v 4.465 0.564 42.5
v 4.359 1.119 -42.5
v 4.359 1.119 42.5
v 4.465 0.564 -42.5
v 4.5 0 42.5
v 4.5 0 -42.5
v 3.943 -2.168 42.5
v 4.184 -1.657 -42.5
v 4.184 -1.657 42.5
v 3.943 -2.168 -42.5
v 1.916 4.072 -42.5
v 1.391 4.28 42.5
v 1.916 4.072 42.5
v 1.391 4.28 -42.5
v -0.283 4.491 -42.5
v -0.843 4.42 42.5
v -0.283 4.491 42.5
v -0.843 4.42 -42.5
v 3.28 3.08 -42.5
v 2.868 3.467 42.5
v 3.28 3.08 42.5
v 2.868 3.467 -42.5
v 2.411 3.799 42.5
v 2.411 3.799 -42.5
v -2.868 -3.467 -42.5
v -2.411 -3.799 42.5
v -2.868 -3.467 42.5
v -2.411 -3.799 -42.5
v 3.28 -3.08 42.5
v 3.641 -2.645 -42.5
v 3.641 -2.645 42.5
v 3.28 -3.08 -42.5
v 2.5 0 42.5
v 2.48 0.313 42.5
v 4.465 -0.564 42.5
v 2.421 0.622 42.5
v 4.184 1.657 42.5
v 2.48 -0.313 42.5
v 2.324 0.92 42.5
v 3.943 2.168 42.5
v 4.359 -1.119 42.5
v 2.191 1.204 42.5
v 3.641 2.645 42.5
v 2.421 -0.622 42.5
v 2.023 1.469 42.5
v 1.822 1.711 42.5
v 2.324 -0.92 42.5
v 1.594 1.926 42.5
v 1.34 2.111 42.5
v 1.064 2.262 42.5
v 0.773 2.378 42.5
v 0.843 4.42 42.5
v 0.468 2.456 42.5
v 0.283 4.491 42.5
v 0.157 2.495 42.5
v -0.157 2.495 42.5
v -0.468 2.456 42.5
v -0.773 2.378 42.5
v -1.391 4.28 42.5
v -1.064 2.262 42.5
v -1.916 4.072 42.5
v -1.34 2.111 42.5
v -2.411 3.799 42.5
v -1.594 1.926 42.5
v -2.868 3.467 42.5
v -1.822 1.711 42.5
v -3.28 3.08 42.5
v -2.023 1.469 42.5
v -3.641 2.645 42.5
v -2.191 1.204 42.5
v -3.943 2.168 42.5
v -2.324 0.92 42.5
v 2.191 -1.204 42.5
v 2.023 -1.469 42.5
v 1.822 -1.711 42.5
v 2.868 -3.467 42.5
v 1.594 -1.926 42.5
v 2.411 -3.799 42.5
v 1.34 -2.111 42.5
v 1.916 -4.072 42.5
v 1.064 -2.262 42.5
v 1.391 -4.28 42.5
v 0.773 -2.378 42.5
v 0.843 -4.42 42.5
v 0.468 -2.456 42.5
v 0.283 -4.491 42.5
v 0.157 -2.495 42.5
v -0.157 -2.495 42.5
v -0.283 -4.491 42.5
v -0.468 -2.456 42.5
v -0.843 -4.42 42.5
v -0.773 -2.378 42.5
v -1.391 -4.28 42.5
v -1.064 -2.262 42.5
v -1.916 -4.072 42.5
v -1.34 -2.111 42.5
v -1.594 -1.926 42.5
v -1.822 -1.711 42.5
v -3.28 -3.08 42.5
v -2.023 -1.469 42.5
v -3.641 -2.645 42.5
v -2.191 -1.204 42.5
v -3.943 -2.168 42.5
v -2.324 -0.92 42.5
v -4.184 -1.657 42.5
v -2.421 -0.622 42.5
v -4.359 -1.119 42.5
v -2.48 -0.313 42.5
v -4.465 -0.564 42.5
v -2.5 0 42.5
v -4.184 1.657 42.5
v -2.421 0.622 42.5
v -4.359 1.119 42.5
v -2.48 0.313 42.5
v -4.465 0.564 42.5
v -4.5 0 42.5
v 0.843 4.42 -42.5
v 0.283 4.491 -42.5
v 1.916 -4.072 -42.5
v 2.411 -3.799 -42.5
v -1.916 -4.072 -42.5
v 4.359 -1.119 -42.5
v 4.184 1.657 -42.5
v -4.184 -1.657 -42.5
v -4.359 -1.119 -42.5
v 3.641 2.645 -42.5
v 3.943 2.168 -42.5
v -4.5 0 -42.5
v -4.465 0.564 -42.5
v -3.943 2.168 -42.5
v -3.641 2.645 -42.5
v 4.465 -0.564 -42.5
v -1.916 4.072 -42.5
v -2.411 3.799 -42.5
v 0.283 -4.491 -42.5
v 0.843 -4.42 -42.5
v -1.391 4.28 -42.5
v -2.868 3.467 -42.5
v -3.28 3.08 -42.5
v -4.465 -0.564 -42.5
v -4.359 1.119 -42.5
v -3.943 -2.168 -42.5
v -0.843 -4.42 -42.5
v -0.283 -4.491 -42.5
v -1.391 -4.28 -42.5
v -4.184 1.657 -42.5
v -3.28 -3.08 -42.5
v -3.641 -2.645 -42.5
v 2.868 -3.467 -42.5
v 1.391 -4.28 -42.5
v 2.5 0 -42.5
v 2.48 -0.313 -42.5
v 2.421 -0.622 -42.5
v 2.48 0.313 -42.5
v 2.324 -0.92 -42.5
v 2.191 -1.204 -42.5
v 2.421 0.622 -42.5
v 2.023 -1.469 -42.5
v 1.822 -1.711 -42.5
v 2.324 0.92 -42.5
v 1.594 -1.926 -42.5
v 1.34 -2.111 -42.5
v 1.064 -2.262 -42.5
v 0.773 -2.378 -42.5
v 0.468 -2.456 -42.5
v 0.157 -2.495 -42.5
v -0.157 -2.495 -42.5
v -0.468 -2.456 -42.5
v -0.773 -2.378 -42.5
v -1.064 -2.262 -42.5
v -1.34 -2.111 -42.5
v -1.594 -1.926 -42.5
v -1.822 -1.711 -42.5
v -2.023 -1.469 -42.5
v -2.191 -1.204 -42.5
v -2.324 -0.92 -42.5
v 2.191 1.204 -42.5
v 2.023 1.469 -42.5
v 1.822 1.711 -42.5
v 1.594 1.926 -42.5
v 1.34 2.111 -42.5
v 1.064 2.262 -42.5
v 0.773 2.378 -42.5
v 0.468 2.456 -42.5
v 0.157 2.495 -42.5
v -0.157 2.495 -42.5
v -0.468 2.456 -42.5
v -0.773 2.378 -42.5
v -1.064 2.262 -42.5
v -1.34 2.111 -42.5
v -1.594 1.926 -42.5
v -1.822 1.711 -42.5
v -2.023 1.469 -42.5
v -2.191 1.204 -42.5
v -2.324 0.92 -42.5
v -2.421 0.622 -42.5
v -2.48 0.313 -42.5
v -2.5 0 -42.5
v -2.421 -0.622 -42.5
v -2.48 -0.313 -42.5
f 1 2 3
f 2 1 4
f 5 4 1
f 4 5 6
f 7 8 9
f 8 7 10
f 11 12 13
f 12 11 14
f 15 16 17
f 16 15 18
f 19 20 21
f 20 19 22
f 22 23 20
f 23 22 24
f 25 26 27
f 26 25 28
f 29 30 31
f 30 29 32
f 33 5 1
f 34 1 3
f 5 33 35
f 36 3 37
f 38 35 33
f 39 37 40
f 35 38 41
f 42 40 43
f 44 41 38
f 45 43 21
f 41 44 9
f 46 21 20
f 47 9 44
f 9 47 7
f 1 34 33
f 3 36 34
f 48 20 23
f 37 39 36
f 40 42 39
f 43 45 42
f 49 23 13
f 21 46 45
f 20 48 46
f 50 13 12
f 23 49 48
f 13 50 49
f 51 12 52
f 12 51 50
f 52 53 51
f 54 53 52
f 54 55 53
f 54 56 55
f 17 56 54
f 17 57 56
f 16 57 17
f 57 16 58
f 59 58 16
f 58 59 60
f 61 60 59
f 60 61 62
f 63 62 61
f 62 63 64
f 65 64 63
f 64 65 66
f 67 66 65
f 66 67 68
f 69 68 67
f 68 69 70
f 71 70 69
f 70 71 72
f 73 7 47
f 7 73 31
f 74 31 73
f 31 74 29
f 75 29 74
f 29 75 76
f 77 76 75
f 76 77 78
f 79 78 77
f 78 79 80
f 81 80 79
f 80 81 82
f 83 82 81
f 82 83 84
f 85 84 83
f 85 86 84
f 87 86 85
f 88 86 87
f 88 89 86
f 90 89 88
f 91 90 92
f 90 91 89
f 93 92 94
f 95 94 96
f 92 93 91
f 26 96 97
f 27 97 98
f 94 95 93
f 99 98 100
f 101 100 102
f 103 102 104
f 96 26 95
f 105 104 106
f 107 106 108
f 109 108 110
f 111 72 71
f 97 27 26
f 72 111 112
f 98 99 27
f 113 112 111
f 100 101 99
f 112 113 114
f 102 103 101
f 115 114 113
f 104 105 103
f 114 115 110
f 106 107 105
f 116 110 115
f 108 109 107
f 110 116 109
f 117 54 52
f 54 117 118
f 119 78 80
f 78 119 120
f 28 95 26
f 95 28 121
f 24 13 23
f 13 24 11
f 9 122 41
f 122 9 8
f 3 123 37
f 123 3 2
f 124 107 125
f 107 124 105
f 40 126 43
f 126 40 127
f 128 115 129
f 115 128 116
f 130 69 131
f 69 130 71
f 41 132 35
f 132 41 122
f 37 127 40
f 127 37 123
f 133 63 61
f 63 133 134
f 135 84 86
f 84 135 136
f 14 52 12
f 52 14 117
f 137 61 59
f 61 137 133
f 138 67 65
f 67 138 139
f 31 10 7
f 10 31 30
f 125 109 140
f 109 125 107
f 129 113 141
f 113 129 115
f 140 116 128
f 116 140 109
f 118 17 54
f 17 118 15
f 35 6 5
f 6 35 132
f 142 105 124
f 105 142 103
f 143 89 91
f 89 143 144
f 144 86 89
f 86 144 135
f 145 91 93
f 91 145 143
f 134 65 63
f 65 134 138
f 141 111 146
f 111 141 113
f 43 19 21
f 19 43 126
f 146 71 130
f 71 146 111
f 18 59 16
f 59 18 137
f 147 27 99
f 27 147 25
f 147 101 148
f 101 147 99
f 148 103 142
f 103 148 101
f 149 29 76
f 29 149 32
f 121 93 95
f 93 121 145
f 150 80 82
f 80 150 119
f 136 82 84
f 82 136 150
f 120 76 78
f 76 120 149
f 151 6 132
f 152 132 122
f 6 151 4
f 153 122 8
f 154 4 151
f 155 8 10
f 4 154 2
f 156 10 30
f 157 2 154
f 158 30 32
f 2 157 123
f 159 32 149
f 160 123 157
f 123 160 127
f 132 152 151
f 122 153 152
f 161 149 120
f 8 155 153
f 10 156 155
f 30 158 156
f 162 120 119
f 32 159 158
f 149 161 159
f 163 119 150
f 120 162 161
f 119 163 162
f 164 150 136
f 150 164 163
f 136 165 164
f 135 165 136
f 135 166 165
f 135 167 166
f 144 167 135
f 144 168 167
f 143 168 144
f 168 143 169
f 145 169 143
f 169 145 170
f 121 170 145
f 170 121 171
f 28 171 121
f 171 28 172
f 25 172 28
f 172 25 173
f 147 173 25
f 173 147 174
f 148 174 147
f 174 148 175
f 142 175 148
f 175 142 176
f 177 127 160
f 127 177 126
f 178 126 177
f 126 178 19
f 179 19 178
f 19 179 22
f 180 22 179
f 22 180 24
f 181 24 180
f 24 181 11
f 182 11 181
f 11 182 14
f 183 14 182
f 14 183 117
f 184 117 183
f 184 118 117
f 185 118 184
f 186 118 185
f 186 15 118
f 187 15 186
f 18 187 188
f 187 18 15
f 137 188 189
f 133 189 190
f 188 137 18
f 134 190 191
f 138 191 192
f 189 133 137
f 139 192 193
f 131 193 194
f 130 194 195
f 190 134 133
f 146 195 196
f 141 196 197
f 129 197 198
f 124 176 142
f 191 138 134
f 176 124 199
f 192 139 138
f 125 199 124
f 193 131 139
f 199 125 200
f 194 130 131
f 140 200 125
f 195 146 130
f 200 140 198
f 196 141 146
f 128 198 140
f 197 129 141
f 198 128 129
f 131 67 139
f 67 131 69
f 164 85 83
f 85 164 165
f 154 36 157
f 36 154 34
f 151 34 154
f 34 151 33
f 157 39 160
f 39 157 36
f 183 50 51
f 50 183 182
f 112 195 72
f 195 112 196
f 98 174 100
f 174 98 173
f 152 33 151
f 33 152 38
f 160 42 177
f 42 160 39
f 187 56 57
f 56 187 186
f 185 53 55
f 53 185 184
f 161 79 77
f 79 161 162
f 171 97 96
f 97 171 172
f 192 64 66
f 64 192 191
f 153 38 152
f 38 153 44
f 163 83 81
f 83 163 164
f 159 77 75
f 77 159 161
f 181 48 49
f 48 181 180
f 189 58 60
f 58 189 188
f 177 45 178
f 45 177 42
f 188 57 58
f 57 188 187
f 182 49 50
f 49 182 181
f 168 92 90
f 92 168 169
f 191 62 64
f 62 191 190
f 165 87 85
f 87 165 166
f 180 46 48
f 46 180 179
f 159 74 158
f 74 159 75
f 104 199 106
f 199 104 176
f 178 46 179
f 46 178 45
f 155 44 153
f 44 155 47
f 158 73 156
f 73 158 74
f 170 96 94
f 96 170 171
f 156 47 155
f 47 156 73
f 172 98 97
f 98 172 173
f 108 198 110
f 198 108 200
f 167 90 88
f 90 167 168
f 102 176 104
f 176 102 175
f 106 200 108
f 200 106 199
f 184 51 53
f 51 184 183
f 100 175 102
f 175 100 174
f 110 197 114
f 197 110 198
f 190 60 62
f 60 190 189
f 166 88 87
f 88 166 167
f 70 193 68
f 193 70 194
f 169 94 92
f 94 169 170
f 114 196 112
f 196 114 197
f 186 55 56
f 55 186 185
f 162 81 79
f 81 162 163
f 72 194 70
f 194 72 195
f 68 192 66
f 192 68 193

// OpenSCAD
$fn = 50;


difference() {
	union() {
		translate(v = [0, 0, -42.5000000000]) {
			cylinder(h = 85, r = 4.5000000000);
		}
	}
	union() {
		translate(v = [0, 0, -100.0000000000]) {
			cylinder(h = 200, r = 2.5000000000);
		}
	}
}
